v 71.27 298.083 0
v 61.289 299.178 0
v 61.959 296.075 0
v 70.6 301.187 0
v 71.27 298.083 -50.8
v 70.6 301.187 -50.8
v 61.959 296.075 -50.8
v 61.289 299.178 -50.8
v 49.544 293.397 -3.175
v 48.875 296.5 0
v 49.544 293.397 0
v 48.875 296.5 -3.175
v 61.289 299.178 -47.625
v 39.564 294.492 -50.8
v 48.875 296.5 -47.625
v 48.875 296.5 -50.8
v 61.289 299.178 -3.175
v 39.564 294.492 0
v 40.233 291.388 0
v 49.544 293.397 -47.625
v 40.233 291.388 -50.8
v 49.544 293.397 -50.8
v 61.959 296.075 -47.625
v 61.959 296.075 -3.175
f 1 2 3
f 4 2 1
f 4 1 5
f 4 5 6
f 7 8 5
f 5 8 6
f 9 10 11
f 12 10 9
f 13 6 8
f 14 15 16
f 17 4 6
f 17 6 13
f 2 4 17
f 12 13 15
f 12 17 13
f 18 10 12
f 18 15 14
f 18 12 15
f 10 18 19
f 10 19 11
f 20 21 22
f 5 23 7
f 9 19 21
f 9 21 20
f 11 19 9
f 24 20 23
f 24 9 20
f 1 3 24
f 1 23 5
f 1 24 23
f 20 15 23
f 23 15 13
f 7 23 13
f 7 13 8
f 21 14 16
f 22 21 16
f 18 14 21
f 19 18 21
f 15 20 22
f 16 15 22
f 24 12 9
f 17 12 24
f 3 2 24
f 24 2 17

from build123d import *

# Parameters (mm, degrees)
BOSS_EXTRUDE1_DEPTH = 50.8
SKETCH2_W           = 12.7
SKETCH2_H           = 3.175
CUT_EXTRUDE1_DEPTH  = 3.175


with BuildPart() as part:
    # Sketch1 → Boss-Extrude1 (new body)
    with BuildSketch(Plane.XY):
        Polygon((39.563966172, 294.491722579), (40.233488411, 291.388117421), (71.269539981, 298.083339818), (70.600017742, 301.186944975), align=None)
    extrude(amount=-BOSS_EXTRUDE1_DEPTH)

    # Sketch2 → Cut-Extrude1 (cut)
    with BuildSketch(Plane(origin=(-58.944661512, 273.241043546, 0), x_dir=(0.977513435, 0.210873146, 0), z_dir=(-0.210873146, 0.977513435, 0))):
        with Locations((116.649704601, 49.2125)):
            Rectangle(SKETCH2_W, SKETCH2_H)
        with Locations((116.649704601, 1.5875)):
            Rectangle(SKETCH2_W, SKETCH2_H)
    extrude(amount=-CUT_EXTRUDE1_DEPTH, mode=Mode.SUBTRACT)


solid = part.part
